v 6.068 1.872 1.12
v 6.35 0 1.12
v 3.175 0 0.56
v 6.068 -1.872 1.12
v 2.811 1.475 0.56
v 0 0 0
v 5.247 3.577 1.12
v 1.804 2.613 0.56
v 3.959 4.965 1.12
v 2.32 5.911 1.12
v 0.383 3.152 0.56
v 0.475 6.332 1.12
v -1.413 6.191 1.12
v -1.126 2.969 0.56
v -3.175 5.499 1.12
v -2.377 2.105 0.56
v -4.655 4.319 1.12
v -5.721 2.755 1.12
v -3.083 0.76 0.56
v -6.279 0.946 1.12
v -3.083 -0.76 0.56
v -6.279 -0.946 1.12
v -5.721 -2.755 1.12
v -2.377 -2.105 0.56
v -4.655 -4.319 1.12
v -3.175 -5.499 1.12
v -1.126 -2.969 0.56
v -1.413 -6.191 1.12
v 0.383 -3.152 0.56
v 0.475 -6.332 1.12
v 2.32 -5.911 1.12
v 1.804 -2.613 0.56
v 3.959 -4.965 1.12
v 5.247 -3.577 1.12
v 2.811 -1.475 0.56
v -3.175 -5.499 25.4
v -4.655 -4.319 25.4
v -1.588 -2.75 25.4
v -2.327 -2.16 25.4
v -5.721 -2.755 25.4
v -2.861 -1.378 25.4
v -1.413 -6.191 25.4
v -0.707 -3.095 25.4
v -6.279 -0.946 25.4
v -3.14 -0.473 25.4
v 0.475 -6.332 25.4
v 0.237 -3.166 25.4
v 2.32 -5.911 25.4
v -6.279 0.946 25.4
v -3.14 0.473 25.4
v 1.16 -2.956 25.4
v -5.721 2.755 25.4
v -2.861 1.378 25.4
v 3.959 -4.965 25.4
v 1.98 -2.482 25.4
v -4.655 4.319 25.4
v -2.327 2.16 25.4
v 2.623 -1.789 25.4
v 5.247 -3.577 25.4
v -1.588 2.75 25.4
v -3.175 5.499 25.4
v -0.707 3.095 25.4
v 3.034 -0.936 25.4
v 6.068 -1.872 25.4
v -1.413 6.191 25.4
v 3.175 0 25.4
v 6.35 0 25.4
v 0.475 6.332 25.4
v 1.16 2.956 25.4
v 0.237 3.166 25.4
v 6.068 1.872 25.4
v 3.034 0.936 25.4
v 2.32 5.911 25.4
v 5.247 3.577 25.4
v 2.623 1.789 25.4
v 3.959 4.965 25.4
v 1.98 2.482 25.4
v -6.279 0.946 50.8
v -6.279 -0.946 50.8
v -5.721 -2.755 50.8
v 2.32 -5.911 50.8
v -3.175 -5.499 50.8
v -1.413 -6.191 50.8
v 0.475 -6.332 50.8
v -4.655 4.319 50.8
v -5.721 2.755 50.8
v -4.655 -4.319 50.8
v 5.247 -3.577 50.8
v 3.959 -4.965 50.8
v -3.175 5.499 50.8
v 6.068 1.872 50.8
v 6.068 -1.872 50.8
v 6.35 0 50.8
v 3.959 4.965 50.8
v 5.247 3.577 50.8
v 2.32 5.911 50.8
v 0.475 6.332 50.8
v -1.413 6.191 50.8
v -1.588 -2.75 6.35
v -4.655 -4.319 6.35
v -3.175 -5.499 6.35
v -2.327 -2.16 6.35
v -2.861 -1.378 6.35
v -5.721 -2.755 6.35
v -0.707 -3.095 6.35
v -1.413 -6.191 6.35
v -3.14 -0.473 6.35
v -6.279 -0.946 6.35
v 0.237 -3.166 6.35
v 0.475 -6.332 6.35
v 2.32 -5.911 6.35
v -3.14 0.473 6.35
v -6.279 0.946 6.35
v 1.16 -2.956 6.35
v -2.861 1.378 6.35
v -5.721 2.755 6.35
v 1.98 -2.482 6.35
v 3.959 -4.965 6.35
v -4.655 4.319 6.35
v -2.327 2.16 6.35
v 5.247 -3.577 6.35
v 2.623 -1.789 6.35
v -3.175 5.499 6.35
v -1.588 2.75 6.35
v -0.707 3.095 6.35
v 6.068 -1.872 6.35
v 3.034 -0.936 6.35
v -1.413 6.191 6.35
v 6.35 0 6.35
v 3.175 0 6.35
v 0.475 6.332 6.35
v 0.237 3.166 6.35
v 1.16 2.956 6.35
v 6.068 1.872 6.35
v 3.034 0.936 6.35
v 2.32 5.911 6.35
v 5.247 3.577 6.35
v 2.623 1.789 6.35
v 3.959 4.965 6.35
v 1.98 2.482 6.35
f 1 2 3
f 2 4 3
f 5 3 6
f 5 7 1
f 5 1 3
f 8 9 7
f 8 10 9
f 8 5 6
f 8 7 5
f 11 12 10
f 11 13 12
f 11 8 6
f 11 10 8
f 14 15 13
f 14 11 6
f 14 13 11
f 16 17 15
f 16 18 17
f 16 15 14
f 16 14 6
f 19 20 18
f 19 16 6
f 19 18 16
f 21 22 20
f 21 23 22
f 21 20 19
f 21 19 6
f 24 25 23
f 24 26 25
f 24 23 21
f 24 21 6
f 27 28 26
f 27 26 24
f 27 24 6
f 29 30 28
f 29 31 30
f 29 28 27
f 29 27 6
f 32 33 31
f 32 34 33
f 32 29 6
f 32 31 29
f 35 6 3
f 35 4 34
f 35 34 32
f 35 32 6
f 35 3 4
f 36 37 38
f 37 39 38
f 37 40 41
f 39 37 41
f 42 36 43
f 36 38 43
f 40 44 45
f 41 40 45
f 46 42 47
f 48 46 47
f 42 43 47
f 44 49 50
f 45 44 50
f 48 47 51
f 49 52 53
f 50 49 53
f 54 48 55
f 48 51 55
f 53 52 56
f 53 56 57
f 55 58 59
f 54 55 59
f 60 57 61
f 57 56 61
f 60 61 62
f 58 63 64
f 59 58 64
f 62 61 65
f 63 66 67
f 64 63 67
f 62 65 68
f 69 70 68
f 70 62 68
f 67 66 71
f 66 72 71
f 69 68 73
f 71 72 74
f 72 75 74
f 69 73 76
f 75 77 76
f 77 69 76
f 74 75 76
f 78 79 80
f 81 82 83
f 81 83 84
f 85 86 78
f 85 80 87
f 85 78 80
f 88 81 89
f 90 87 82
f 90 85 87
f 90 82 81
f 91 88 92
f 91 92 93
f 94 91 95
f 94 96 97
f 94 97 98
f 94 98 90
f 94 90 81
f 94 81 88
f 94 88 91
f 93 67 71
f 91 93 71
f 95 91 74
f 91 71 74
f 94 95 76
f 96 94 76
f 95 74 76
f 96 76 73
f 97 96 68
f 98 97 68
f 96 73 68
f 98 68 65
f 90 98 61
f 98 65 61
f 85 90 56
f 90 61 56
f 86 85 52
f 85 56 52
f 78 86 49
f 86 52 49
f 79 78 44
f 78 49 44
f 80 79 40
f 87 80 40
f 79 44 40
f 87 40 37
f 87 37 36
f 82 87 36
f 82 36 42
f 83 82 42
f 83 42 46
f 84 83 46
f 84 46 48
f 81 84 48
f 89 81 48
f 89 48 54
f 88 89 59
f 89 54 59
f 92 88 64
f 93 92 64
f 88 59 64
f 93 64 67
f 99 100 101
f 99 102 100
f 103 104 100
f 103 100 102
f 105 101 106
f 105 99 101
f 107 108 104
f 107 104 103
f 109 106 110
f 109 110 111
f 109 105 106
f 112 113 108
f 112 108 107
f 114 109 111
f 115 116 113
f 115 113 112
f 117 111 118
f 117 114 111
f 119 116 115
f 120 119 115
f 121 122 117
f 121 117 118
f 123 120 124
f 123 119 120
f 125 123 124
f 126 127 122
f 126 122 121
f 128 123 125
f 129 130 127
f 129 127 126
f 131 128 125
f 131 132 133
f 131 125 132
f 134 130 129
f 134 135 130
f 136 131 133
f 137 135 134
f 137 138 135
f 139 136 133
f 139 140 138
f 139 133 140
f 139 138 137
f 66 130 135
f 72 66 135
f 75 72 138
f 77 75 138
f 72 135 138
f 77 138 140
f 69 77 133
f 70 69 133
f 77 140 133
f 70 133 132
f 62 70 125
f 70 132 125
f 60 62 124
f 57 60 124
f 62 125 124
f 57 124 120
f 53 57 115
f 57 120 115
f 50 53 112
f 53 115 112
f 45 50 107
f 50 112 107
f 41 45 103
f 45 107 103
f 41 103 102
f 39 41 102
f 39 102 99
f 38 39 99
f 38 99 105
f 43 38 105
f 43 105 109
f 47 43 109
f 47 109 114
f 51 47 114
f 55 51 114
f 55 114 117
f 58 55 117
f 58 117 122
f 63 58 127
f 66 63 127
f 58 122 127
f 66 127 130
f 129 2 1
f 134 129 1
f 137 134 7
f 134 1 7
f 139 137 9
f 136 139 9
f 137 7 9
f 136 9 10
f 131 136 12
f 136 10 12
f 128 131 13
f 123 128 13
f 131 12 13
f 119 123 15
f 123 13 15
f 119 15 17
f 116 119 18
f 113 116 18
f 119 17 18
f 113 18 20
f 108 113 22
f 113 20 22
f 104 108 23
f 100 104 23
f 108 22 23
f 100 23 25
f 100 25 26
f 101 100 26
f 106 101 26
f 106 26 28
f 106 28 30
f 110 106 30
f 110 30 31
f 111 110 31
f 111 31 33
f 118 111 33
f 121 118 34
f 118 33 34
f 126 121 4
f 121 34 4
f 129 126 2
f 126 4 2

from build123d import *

# Parameters (mm, degrees)
F0_R     = 6.35
F1_DEPTH = 6.35
F2_R     = 3.175
F3_DEPTH = 19.05
F4_R     = 6.35
F5_DEPTH = 25.4
F6_SIZE2 = 1.1196763275
F6_SIZE  = 6.35


with BuildPart() as f1:
    # F0 (on Top) → F1 (new body)
    with BuildSketch(Plane.XY):
        Circle(F0_R)
    extrude(amount=F1_DEPTH)

    # F2 (on face) → F3 (join)
    with BuildSketch(Plane.XY.offset(6.35)):
        Circle(F2_R)
    extrude(amount=F3_DEPTH)

    # F4 (on face) → F5 (join)
    with BuildSketch(Plane.XY.offset(25.4)):
        Circle(F4_R)
    extrude(amount=F5_DEPTH)

    # F6
    f6_edges = [f1.edges().sort_by_distance(p)[0] for p in [
        (-6.35, 0, 0),
    ]]
    f6_side = f1.faces().sort_by_distance((0, 0, 0))[0]
    chamfer(f6_edges, length=F6_SIZE, length2=F6_SIZE2, reference=f6_side)


solid = f1.part
